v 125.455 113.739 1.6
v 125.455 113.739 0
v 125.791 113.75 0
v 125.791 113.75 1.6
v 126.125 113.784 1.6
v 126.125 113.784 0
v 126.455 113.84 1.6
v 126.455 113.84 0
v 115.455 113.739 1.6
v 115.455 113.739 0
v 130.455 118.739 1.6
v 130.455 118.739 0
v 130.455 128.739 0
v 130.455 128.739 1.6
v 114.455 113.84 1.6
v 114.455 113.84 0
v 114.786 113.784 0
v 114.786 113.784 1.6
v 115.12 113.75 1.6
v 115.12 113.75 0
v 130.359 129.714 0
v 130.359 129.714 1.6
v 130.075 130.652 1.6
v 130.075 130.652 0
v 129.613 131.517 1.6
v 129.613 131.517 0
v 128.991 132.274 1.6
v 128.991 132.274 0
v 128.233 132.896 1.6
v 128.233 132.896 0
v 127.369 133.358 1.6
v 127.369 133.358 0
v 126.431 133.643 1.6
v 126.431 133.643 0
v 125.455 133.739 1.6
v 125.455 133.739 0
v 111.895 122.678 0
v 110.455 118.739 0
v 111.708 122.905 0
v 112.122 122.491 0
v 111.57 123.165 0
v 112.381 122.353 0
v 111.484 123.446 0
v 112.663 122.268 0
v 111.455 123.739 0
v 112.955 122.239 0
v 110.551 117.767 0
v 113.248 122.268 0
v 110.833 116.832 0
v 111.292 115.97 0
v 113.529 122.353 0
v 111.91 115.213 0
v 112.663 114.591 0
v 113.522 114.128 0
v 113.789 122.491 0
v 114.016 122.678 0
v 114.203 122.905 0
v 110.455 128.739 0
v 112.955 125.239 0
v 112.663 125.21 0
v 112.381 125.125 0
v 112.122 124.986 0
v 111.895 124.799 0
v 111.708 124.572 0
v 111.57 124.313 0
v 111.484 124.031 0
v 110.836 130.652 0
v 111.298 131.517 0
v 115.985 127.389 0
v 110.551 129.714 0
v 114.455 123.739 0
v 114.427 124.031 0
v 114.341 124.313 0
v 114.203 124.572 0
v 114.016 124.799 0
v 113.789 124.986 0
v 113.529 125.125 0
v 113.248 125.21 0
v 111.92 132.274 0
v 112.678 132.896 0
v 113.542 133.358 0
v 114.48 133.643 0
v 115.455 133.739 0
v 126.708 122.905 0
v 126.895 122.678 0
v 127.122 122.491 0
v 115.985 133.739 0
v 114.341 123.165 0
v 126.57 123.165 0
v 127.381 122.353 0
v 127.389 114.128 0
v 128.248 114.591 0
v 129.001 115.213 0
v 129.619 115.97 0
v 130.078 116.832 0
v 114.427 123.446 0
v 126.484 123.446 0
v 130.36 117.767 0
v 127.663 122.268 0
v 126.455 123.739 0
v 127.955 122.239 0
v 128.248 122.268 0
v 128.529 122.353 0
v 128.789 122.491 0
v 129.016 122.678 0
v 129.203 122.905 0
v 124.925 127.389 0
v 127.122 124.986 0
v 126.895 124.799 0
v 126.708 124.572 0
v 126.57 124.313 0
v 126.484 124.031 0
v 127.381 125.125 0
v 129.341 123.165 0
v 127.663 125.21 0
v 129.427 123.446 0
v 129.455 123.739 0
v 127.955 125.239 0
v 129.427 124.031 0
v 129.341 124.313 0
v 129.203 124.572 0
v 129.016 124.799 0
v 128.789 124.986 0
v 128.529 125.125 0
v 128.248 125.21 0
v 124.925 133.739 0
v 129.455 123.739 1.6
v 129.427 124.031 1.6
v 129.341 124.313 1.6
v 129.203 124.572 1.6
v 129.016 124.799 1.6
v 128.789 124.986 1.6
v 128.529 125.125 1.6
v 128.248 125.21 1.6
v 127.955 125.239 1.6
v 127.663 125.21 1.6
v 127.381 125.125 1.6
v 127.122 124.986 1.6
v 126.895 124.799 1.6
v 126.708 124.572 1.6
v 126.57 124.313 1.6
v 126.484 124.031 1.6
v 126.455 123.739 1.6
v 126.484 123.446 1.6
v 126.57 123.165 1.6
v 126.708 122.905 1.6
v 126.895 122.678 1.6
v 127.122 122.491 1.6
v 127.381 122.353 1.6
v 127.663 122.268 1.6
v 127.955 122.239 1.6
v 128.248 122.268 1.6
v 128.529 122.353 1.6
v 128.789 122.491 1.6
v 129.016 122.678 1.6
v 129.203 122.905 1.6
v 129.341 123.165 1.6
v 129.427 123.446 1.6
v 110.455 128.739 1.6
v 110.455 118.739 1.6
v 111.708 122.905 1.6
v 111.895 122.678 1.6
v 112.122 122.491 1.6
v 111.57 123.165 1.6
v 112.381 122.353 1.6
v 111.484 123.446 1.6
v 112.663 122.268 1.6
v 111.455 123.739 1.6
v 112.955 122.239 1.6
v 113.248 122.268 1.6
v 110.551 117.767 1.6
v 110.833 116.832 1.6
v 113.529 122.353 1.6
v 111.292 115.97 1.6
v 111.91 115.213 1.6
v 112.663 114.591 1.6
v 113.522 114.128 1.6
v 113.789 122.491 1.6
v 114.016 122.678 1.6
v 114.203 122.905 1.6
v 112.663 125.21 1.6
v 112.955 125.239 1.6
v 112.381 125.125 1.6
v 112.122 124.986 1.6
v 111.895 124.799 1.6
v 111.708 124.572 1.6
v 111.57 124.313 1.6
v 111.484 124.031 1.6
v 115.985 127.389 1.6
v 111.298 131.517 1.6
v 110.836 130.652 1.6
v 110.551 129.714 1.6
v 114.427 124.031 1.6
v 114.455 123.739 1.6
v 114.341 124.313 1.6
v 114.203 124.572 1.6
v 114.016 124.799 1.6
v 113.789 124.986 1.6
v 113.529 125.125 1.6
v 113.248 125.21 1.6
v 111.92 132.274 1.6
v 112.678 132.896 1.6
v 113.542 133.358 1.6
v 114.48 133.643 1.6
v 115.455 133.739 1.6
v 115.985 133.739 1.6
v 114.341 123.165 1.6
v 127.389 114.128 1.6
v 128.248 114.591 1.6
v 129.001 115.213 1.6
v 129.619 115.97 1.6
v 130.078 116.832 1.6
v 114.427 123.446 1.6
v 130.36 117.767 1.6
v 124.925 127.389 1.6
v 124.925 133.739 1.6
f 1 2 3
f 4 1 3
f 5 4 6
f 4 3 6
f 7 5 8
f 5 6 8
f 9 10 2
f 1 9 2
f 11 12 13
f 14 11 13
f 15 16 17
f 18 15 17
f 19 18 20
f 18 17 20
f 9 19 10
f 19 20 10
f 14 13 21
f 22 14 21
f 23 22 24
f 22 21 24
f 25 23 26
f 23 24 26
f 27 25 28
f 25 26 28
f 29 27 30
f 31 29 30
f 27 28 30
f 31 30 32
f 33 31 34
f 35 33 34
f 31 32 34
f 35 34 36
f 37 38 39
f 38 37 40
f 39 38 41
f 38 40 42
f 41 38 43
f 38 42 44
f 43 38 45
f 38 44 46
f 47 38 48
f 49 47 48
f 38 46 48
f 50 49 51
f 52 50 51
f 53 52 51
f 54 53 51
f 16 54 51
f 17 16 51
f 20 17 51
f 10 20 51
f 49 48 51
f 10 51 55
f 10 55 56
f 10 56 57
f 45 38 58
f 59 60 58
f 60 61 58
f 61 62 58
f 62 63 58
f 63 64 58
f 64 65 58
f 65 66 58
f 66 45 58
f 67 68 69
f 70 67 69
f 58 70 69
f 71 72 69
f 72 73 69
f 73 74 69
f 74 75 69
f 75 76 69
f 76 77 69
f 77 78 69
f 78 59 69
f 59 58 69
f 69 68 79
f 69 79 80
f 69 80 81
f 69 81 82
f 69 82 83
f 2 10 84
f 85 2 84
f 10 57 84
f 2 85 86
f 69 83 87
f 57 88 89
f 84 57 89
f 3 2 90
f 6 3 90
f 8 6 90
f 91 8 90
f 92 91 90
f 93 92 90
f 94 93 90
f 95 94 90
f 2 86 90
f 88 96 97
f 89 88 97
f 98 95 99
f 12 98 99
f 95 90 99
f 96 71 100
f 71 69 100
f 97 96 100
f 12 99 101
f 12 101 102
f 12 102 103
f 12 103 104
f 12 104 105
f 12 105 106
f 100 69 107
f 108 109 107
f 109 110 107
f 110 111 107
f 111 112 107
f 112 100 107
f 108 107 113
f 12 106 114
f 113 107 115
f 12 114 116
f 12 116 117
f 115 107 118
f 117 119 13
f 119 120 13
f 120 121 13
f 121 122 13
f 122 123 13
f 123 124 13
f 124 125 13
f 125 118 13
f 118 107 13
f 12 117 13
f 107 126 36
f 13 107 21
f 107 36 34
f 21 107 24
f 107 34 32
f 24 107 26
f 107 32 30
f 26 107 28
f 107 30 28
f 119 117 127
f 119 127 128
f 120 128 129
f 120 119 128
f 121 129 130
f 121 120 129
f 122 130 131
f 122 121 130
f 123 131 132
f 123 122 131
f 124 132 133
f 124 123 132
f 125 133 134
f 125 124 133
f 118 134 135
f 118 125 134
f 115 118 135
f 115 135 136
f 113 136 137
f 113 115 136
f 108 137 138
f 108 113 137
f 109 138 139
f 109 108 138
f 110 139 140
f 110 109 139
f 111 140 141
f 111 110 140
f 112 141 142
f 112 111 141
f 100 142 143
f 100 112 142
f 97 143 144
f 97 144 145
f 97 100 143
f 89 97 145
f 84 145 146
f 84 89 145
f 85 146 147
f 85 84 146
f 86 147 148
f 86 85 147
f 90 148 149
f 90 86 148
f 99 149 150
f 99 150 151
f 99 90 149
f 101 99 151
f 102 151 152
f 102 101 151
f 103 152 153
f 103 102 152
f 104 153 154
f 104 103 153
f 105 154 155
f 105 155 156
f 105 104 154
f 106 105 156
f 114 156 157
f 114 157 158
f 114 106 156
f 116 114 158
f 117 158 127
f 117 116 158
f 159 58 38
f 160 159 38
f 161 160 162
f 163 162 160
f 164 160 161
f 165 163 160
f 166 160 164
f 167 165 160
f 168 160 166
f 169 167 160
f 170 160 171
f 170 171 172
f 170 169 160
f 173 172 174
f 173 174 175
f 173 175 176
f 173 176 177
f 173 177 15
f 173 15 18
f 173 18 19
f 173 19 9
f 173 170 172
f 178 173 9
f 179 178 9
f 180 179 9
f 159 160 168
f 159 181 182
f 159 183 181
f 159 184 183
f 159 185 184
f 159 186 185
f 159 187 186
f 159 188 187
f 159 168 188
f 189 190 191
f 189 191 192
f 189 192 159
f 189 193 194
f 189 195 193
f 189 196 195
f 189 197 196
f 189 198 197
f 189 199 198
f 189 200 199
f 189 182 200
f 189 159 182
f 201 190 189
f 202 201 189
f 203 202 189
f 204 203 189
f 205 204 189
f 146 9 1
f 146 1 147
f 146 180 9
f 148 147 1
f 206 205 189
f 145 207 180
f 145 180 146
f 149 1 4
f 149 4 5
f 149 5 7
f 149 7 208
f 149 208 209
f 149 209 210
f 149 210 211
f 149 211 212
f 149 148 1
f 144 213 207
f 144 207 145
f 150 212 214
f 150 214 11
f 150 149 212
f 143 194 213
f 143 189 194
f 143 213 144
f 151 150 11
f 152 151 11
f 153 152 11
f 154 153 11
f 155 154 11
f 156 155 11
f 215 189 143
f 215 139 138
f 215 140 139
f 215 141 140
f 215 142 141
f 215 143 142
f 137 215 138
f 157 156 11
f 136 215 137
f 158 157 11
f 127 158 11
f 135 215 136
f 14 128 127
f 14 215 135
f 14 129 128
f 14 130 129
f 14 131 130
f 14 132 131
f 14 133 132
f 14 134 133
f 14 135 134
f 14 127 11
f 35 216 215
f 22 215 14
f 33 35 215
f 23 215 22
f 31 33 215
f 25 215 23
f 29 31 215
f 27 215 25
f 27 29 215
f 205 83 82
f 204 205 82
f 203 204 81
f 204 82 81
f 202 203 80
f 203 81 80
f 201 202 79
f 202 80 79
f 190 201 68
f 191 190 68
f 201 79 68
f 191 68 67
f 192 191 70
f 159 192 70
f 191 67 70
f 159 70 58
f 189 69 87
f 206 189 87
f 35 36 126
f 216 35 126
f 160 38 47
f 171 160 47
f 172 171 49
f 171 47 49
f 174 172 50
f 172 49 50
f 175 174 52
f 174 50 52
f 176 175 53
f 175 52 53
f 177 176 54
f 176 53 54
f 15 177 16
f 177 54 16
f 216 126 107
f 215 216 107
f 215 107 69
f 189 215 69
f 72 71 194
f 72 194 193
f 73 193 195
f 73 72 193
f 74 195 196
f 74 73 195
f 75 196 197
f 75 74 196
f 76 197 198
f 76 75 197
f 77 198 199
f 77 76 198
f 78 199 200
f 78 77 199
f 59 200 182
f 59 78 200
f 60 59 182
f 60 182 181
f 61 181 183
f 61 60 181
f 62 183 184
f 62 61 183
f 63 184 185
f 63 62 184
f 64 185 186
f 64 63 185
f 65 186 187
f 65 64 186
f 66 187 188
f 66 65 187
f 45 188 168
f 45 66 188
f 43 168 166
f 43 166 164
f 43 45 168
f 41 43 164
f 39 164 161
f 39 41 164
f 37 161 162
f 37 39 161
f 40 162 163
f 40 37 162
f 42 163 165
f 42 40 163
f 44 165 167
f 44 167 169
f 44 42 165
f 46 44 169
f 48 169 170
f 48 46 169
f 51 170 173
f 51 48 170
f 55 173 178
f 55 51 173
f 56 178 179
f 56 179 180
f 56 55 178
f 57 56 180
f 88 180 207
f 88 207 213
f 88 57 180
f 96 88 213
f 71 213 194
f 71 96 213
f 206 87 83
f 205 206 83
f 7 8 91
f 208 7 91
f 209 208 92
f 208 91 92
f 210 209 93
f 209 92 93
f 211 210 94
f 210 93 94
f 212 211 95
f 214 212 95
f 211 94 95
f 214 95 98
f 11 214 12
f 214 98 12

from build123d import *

# Parameters (mm, degrees)
SKETCH13_R          = 1.5
BOSS_EXTRUDE1_DEPTH = 1.6


with BuildPart() as part:
    # Sketch13 → Boss-Extrude1 (new body)
    with BuildSketch(Plane.XY):
        with BuildLine():
            Line((115.98540719, 133.738694526), (115.45540719, 133.738694526))
            ThreePointArc((115.45540719, 133.738694526), (111.919873284, 132.274228432), (110.45540719, 128.738694526))
            Line((110.45540719, 128.738694526), (110.45540719, 118.738694526))
            ThreePointArc((110.45540719, 118.738694526), (111.919873284, 115.20316062), (115.45540719, 113.738694526))
            Line((115.45540719, 113.738694526), (125.45540719, 113.738694526))
            ThreePointArc((125.45540719, 113.738694526), (128.990941096, 115.20316062), (130.45540719, 118.738694526))
            Line((130.45540719, 118.738694526), (130.45540719, 128.738694526))
            ThreePointArc((130.45540719, 128.738694526), (128.990941096, 132.274228432), (125.45540719, 133.738694526))
            Line((125.45540719, 133.738694526), (124.92540719, 133.738694526))
            Line((124.92540719, 133.738694526), (124.92540719, 127.388694526))
            Line((124.92540719, 127.388694526), (115.98540719, 127.388694526))
            Line((115.98540719, 127.388694526), (115.98540719, 133.738694526))
        make_face()
        with Locations((112.95540719, 123.738694526)):
            Circle(SKETCH13_R, mode=Mode.SUBTRACT)
        with Locations((127.95540719, 123.738694526)):
            Circle(SKETCH13_R, mode=Mode.SUBTRACT)
    extrude(amount=BOSS_EXTRUDE1_DEPTH)


solid = part.part
